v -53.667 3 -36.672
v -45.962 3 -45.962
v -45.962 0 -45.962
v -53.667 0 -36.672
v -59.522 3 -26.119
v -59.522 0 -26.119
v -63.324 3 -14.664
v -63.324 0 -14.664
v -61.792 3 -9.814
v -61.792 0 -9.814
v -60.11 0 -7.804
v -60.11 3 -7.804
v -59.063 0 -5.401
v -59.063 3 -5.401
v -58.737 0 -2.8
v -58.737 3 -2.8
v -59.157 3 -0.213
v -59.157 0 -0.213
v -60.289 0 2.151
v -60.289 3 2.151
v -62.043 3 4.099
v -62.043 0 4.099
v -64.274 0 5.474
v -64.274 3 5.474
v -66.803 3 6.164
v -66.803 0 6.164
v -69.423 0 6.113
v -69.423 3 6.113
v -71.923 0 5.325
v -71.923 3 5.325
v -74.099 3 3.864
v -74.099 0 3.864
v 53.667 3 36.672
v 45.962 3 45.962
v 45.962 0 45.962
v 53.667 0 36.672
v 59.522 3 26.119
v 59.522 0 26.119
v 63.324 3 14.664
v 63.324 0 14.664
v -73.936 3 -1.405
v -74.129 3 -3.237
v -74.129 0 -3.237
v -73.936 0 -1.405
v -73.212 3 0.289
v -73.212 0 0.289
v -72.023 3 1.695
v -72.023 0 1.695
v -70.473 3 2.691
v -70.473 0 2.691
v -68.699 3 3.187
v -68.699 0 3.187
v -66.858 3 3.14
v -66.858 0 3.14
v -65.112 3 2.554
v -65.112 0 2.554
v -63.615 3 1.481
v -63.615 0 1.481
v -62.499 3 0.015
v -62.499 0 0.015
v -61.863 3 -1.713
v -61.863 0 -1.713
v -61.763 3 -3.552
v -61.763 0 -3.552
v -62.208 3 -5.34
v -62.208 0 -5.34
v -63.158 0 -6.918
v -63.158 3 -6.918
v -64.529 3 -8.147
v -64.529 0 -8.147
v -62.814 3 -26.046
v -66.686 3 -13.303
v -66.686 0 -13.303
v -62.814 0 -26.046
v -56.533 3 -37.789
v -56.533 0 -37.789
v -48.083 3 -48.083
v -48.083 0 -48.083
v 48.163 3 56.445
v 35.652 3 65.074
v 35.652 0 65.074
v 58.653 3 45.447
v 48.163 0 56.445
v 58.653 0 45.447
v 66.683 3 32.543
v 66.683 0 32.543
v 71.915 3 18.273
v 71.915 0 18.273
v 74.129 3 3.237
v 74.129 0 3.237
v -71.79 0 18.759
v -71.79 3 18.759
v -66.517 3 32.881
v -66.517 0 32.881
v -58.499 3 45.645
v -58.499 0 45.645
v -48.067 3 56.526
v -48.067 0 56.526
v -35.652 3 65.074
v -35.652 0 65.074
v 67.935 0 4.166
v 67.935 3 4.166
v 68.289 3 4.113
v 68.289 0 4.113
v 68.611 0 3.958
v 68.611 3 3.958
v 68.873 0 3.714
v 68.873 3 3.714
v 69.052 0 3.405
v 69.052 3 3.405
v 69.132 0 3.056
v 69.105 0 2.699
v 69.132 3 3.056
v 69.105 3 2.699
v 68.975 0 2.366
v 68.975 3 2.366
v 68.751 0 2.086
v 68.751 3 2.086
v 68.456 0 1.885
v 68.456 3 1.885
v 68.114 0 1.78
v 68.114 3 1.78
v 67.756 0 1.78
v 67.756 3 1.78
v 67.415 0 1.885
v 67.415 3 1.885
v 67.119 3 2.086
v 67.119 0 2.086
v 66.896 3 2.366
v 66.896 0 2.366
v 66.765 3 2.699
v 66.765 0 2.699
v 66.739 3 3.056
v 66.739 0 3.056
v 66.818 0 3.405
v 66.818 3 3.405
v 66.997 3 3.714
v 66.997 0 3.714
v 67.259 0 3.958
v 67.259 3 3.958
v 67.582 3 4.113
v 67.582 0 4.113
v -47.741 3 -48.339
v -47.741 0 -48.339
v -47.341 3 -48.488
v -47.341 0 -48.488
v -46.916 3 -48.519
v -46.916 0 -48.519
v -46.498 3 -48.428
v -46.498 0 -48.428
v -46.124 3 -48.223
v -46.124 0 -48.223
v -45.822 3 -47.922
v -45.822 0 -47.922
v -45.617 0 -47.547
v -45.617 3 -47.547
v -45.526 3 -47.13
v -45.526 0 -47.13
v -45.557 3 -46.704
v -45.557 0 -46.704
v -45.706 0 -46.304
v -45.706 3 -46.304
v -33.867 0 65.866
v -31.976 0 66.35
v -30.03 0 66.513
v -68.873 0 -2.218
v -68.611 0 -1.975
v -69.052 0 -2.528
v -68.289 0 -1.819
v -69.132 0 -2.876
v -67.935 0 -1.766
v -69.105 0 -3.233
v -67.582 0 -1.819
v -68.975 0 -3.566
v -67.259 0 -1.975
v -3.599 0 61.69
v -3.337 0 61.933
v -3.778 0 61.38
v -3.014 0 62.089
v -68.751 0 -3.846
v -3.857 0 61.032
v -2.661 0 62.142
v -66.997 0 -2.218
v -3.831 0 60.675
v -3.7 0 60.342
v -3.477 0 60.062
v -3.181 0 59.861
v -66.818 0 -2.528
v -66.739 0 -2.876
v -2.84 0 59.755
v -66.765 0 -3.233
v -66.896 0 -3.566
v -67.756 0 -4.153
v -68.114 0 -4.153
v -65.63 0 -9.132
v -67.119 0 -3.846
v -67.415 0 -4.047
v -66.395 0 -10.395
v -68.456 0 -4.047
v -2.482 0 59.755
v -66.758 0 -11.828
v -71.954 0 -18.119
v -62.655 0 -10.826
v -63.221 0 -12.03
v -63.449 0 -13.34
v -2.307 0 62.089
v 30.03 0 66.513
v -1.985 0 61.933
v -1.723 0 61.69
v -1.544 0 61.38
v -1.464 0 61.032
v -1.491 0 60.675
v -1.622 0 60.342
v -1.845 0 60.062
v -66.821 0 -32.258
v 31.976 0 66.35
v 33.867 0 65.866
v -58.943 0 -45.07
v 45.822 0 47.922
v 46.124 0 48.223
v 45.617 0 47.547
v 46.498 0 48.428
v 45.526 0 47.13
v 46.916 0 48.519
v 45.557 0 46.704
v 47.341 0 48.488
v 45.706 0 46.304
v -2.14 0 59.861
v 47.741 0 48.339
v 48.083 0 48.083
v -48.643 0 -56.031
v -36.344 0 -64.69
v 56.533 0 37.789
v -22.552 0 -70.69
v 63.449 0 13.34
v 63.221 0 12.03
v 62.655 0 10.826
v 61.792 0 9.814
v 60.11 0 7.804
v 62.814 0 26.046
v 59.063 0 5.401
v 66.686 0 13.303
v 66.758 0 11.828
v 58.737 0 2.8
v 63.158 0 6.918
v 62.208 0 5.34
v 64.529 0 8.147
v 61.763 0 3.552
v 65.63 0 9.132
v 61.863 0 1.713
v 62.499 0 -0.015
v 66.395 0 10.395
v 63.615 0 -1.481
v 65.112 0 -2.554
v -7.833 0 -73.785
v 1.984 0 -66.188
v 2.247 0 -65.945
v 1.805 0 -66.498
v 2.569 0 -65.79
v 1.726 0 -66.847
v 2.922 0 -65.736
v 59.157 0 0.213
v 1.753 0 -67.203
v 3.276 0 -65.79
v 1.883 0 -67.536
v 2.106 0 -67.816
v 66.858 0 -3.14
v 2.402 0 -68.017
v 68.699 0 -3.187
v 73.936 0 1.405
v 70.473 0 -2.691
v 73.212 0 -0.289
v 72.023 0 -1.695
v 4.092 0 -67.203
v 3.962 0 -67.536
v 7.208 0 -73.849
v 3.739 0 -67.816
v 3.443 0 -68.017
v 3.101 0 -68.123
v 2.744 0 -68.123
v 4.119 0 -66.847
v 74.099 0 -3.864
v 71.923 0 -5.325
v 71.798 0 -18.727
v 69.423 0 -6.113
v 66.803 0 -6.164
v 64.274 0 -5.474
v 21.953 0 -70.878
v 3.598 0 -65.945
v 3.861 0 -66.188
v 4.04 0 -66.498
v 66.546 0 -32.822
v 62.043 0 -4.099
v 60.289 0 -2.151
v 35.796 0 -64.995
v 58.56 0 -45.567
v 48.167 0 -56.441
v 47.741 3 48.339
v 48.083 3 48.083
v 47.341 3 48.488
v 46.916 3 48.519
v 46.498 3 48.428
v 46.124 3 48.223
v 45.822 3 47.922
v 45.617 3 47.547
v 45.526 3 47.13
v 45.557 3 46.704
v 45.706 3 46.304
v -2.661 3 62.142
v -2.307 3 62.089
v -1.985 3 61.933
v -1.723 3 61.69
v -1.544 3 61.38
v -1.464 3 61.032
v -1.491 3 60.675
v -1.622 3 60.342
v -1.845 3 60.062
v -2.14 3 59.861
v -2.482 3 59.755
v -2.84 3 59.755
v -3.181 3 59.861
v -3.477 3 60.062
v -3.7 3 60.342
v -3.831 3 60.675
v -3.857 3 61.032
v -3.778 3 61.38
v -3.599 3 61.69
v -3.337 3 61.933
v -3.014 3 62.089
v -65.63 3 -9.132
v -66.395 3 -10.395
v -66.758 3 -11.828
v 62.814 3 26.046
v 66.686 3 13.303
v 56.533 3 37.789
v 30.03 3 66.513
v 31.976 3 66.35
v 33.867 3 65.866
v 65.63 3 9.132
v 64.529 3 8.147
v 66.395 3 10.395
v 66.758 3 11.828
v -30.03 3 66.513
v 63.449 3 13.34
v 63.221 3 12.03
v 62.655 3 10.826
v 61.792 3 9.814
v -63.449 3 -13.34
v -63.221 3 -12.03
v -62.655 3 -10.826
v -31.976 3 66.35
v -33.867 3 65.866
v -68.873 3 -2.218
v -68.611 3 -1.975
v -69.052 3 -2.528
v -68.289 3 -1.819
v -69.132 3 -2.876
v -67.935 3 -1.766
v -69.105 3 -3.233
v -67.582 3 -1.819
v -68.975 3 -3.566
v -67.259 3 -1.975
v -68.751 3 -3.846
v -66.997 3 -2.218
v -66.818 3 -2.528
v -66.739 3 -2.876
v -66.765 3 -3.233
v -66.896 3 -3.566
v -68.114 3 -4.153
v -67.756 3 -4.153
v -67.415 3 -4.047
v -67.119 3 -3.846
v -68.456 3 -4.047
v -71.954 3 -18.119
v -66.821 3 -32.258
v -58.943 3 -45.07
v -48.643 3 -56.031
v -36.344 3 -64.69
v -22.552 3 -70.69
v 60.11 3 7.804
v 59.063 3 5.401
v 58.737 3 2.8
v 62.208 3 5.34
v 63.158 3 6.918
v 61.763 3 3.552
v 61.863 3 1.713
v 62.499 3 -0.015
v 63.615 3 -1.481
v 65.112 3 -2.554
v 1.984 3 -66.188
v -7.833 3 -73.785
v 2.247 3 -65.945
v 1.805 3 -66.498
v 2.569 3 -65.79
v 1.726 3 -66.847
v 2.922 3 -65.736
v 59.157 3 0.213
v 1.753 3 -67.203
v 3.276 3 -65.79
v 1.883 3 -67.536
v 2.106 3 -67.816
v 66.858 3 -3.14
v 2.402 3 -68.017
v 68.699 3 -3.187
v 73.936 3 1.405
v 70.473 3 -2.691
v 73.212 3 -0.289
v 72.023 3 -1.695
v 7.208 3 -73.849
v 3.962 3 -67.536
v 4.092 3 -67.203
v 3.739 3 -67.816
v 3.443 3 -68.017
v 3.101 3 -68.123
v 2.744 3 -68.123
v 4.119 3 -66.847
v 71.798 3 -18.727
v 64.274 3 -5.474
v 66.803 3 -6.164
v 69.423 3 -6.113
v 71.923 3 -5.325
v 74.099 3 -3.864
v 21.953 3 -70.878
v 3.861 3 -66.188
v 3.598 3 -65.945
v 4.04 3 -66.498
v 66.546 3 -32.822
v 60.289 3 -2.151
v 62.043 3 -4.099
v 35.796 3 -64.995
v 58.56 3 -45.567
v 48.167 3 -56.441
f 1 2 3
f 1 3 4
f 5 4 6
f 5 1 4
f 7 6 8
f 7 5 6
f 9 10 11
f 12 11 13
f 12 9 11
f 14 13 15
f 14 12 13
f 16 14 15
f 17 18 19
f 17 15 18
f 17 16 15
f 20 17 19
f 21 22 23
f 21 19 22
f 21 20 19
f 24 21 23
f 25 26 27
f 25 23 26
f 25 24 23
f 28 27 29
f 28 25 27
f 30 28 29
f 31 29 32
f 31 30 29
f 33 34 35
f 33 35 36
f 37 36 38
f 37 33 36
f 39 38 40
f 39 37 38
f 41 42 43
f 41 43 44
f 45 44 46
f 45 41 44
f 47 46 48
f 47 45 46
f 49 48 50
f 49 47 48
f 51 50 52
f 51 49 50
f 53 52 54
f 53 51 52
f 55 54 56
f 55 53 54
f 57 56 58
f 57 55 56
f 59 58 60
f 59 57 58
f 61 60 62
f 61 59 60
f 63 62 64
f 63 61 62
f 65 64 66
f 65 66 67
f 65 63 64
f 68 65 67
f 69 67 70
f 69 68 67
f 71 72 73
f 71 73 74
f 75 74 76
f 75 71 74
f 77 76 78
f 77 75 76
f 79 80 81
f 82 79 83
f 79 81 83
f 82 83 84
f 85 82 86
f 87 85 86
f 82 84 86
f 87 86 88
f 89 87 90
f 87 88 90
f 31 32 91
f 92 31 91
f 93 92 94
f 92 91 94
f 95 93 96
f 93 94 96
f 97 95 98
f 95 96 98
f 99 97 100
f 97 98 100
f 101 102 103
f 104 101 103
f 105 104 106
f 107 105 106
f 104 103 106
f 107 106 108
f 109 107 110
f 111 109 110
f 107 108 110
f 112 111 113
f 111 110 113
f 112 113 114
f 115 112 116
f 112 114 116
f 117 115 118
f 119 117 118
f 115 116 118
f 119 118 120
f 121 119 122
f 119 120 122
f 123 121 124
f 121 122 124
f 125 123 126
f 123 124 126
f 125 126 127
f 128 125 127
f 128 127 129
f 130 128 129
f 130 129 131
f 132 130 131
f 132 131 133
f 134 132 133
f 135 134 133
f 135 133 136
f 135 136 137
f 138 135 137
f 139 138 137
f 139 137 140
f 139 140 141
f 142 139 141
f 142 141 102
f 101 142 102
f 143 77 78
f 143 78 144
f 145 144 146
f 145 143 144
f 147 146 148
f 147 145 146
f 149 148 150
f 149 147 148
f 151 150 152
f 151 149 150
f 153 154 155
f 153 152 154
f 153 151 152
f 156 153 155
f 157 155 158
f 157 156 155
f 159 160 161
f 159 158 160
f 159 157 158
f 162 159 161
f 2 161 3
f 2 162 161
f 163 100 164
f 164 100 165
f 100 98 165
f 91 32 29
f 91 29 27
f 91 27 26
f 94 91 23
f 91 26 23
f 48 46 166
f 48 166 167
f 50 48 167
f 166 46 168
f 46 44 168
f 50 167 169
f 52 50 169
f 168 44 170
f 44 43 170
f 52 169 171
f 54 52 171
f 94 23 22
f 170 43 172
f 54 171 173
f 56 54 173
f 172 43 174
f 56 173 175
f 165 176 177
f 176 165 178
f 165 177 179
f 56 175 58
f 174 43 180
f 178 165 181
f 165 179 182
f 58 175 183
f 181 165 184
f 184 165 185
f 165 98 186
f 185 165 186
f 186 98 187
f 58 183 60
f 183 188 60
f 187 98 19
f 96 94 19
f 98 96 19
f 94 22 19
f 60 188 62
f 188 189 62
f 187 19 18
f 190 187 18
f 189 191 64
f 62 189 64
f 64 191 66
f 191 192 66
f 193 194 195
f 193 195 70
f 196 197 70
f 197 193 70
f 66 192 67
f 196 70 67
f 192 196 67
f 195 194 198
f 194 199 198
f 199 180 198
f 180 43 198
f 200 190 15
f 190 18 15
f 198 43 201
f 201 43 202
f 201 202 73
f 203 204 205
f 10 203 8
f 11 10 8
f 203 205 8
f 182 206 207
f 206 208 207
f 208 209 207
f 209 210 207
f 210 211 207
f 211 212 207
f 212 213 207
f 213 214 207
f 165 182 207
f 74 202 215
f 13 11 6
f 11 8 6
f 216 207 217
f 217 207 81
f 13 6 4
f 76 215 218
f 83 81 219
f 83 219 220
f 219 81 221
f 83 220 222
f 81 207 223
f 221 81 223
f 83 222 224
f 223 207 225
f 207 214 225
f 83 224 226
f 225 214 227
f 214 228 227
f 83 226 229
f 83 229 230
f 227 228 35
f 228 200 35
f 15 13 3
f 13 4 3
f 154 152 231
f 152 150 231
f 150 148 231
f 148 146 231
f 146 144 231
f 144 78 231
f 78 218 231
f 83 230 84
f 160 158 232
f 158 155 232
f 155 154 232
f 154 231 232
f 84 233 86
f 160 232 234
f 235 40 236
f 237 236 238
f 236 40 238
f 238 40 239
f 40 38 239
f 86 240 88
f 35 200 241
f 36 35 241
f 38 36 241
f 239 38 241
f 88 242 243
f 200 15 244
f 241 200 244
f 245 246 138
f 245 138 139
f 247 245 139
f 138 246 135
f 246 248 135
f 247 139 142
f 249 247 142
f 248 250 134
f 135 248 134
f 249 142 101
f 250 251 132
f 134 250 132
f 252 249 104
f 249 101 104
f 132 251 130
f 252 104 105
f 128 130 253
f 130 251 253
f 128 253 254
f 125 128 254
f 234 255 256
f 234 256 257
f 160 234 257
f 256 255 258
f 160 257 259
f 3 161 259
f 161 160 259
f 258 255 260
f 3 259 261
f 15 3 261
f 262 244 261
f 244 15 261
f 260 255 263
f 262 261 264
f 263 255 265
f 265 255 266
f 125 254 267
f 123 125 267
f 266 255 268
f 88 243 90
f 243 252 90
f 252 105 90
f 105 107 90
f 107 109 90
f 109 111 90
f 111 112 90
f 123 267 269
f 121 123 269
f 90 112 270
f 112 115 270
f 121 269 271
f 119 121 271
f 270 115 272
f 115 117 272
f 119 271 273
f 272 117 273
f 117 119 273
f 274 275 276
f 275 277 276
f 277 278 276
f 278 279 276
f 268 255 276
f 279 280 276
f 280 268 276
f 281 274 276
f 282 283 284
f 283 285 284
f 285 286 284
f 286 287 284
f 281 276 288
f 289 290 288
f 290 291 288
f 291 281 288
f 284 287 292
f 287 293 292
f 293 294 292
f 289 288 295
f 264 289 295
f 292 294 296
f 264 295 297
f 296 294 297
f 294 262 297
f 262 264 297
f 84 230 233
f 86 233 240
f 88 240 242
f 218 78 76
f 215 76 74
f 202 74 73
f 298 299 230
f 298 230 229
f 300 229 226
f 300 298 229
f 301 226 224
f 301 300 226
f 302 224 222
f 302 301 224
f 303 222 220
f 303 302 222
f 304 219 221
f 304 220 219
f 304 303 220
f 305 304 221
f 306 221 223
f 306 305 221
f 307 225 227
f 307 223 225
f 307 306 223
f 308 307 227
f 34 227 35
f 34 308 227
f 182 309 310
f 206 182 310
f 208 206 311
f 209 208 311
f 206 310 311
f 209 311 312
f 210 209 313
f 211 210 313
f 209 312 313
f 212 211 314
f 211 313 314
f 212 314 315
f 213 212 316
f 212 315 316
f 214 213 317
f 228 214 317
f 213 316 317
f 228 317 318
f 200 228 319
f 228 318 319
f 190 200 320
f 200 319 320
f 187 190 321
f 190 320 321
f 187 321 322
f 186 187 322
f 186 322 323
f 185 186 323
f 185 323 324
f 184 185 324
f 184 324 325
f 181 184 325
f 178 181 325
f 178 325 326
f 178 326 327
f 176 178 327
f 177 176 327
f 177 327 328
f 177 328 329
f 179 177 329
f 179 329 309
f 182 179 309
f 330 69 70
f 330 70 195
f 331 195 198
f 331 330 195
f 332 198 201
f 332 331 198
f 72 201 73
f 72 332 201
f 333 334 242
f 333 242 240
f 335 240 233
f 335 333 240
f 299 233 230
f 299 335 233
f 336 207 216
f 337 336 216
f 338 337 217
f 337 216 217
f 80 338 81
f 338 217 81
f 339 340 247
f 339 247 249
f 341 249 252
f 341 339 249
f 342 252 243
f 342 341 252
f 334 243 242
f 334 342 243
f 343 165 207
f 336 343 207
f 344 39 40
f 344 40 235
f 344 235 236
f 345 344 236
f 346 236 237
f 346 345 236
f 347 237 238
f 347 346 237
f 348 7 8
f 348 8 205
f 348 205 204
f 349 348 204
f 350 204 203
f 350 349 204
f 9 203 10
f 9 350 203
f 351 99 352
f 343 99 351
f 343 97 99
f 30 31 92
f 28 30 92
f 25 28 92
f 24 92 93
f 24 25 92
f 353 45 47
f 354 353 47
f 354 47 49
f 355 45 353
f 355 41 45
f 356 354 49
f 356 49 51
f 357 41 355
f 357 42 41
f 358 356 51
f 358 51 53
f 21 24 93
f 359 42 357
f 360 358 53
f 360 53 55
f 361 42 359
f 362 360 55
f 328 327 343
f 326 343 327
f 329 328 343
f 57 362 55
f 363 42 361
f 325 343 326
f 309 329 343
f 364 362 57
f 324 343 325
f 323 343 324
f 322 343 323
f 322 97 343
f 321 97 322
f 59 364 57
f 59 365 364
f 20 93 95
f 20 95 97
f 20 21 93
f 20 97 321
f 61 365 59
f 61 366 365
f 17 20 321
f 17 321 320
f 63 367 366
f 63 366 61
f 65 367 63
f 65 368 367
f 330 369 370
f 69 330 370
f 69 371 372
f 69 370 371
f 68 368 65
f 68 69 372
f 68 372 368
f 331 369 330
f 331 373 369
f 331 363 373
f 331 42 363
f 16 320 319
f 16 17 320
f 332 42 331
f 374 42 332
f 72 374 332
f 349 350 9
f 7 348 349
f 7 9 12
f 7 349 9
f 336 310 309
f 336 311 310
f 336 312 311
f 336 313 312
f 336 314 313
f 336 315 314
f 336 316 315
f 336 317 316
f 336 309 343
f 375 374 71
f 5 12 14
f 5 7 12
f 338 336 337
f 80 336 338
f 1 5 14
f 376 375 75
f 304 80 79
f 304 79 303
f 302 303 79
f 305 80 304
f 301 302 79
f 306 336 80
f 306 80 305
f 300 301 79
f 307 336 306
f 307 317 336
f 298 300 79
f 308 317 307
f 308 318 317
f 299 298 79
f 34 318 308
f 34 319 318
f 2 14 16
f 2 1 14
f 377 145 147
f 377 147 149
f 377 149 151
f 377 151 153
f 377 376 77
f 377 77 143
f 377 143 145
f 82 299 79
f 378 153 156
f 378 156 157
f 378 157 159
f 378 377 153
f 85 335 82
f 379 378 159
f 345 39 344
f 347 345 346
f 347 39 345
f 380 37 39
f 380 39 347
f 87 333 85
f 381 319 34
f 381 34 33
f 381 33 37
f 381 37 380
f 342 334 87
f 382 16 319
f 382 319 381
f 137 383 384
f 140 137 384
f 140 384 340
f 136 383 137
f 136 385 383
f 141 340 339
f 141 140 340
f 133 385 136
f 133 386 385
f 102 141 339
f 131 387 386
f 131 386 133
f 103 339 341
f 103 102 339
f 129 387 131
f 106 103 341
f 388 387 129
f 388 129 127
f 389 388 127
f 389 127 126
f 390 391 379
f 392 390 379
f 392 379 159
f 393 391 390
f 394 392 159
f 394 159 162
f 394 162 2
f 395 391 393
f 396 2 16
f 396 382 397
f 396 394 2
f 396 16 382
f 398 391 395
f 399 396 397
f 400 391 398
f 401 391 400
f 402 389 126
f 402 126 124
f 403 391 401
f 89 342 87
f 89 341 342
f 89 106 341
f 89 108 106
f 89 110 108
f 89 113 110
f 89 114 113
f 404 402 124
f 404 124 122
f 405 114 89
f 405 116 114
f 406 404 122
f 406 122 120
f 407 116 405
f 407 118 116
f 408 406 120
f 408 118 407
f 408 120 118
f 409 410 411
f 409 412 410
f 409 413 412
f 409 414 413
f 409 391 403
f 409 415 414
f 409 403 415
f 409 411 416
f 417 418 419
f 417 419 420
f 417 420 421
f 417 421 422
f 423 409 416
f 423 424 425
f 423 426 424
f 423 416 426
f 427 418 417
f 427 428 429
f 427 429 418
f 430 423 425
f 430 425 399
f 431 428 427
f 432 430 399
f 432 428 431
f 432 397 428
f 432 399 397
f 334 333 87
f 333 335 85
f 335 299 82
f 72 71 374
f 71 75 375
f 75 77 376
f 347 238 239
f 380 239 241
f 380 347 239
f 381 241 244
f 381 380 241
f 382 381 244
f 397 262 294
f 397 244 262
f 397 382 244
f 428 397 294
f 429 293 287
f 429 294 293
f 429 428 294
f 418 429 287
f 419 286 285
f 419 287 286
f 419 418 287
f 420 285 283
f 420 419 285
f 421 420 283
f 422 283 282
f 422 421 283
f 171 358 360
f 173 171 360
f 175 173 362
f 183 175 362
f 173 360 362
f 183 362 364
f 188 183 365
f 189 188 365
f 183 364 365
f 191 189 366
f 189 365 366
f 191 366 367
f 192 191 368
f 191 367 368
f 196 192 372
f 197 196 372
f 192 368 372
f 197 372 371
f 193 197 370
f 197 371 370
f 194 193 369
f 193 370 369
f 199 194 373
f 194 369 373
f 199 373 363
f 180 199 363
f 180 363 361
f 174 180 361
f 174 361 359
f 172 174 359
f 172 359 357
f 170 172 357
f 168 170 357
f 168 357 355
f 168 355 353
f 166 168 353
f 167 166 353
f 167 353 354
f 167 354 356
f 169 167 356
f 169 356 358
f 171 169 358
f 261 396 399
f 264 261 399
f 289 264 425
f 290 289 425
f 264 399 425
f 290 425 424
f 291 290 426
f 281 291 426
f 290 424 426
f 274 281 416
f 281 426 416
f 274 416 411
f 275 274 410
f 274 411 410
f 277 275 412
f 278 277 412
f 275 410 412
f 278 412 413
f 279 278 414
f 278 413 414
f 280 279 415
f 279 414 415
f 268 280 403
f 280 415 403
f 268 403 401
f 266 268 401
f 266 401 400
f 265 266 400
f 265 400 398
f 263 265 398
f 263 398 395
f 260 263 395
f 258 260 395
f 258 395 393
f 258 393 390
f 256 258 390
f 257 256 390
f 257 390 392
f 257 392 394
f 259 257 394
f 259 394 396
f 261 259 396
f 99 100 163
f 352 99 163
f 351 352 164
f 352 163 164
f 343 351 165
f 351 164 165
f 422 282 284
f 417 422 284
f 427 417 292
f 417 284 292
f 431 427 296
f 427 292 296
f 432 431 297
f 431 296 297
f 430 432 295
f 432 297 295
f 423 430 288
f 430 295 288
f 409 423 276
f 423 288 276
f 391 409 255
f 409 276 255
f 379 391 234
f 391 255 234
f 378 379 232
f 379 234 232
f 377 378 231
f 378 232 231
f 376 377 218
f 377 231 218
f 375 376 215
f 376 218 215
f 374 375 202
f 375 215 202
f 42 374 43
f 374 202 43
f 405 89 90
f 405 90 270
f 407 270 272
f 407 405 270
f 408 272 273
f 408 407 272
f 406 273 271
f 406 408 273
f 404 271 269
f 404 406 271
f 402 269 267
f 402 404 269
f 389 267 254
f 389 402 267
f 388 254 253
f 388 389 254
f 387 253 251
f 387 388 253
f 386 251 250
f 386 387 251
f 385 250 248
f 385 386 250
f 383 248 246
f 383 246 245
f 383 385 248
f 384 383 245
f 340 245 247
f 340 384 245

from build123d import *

# Parameters (mm, degrees)
BOSS_EXTRUDE1_DEPTH = 3
SKETCH2_R           = 1.2
CUT_EXTRUDE1_DEPTH  = 105.977521403
CUT_EXTRUDE2_DEPTH  = 105.977521403


with BuildPart() as part:
    # Sketch1 → Boss-Extrude1 (new body)
    with BuildSketch(Plane(origin=(0, 0, 0), x_dir=(1, 0, 0), z_dir=(0, 1, 0))):
        with BuildLine():
            Line((-30.029977361, -66.512867647), (30.029977361, -66.512867647))
            ThreePointArc((30.029977361, -66.512867647), (32.931413623, -66.147401939), (35.651589123, -65.073836471))
            ThreePointArc((35.651589123, -65.073836471), (0, 74.2), (-35.651589123, -65.073836471))
            ThreePointArc((-35.651589123, -65.073836471), (-32.931413623, -66.147401939), (-30.029977361, -66.512867647))
        make_face()
    extrude(amount=BOSS_EXTRUDE1_DEPTH)

    # Sketch2 → Cut-Extrude1 (cut, through all)
    with BuildSketch(Plane(origin=(0, 3, 0), x_dir=(1, 0, 0), z_dir=(0, 1, 0))):
        with Locations(Location((-2.660782629, -60.941941516, 0), (0, 0, 270))):
            Circle(SKETCH2_R)
        with Locations(Location((-67.935279068, 2.966118341, 0), (0, 0, 270))):
            Circle(SKETCH2_R)
        with Locations(Location((2.922498953, 66.936230846, 0), (0, 0, 270))):
            Circle(SKETCH2_R)
        with Locations(Location((67.935279068, -2.966118341, 0), (0, 0, 270))):
            Circle(SKETCH2_R)
    extrude(amount=-CUT_EXTRUDE1_DEPTH, mode=Mode.SUBTRACT)

    # Sketch3 → Cut-Extrude2 (cut, through all)
    with BuildSketch(Plane(origin=(0, 3, 0), x_dir=(1, 0, 0), z_dir=(0, 1, 0))):
        with BuildLine():
            ThreePointArc((-74.129378041, 3.236558543), (-65.111947644, -2.5537367), (-64.529371908, 8.146832232))
            ThreePointArc((-64.529371908, 8.146832232), (-66.395420161, 10.395433666), (-66.686059299, 13.302988203))
            ThreePointArc((-66.686059299, 13.302988203), (-59.961788445, 32.071543875), (-48.083261121, 48.083261121))
            ThreePointArc((-48.083261121, 48.083261121), (-45.961940777, 48.083261121), (-45.961940777, 45.961940777))
            ThreePointArc((-45.961940777, 45.961940777), (-56.839700689, 31.531705085), (-63.324224445, 14.664330822))
            ThreePointArc((-63.324224445, 14.664330822), (-63.220830412, 12.029973663), (-61.791915049, 9.814408532))
            ThreePointArc((-61.791915049, 9.814408532), (-61.096295148, -3.187604024), (-74.099345682, -3.86354364))
            ThreePointArc((-74.099345682, -3.86354364), (-74.19933623, -0.313851977), (-74.129378041, 3.236558543))
        make_face()
        with BuildLine():
            ThreePointArc((74.129378041, -3.236558543), (65.111947644, 2.5537367), (64.529371908, -8.146832232))
            ThreePointArc((64.529371908, -8.146832232), (66.395420161, -10.395433666), (66.686059299, -13.302988203))
            ThreePointArc((66.686059299, -13.302988203), (59.961788445, -32.071543875), (48.083261121, -48.083261121))
            ThreePointArc((48.083261121, -48.083261121), (45.961940777, -48.083261121), (45.961940777, -45.961940777))
            ThreePointArc((45.961940777, -45.961940777), (56.839700689, -31.531705085), (63.324224445, -14.664330822))
            ThreePointArc((63.324224445, -14.664330822), (63.220830412, -12.029973663), (61.791915049, -9.814408532))
            ThreePointArc((61.791915049, -9.814408532), (61.096295148, 3.187604024), (74.099345682, 3.86354364))
            ThreePointArc((74.099345682, 3.86354364), (74.19933623, 0.313851977), (74.129378041, -3.236558543))
        make_face()
    extrude(amount=-CUT_EXTRUDE2_DEPTH, mode=Mode.SUBTRACT)


solid = part.part
